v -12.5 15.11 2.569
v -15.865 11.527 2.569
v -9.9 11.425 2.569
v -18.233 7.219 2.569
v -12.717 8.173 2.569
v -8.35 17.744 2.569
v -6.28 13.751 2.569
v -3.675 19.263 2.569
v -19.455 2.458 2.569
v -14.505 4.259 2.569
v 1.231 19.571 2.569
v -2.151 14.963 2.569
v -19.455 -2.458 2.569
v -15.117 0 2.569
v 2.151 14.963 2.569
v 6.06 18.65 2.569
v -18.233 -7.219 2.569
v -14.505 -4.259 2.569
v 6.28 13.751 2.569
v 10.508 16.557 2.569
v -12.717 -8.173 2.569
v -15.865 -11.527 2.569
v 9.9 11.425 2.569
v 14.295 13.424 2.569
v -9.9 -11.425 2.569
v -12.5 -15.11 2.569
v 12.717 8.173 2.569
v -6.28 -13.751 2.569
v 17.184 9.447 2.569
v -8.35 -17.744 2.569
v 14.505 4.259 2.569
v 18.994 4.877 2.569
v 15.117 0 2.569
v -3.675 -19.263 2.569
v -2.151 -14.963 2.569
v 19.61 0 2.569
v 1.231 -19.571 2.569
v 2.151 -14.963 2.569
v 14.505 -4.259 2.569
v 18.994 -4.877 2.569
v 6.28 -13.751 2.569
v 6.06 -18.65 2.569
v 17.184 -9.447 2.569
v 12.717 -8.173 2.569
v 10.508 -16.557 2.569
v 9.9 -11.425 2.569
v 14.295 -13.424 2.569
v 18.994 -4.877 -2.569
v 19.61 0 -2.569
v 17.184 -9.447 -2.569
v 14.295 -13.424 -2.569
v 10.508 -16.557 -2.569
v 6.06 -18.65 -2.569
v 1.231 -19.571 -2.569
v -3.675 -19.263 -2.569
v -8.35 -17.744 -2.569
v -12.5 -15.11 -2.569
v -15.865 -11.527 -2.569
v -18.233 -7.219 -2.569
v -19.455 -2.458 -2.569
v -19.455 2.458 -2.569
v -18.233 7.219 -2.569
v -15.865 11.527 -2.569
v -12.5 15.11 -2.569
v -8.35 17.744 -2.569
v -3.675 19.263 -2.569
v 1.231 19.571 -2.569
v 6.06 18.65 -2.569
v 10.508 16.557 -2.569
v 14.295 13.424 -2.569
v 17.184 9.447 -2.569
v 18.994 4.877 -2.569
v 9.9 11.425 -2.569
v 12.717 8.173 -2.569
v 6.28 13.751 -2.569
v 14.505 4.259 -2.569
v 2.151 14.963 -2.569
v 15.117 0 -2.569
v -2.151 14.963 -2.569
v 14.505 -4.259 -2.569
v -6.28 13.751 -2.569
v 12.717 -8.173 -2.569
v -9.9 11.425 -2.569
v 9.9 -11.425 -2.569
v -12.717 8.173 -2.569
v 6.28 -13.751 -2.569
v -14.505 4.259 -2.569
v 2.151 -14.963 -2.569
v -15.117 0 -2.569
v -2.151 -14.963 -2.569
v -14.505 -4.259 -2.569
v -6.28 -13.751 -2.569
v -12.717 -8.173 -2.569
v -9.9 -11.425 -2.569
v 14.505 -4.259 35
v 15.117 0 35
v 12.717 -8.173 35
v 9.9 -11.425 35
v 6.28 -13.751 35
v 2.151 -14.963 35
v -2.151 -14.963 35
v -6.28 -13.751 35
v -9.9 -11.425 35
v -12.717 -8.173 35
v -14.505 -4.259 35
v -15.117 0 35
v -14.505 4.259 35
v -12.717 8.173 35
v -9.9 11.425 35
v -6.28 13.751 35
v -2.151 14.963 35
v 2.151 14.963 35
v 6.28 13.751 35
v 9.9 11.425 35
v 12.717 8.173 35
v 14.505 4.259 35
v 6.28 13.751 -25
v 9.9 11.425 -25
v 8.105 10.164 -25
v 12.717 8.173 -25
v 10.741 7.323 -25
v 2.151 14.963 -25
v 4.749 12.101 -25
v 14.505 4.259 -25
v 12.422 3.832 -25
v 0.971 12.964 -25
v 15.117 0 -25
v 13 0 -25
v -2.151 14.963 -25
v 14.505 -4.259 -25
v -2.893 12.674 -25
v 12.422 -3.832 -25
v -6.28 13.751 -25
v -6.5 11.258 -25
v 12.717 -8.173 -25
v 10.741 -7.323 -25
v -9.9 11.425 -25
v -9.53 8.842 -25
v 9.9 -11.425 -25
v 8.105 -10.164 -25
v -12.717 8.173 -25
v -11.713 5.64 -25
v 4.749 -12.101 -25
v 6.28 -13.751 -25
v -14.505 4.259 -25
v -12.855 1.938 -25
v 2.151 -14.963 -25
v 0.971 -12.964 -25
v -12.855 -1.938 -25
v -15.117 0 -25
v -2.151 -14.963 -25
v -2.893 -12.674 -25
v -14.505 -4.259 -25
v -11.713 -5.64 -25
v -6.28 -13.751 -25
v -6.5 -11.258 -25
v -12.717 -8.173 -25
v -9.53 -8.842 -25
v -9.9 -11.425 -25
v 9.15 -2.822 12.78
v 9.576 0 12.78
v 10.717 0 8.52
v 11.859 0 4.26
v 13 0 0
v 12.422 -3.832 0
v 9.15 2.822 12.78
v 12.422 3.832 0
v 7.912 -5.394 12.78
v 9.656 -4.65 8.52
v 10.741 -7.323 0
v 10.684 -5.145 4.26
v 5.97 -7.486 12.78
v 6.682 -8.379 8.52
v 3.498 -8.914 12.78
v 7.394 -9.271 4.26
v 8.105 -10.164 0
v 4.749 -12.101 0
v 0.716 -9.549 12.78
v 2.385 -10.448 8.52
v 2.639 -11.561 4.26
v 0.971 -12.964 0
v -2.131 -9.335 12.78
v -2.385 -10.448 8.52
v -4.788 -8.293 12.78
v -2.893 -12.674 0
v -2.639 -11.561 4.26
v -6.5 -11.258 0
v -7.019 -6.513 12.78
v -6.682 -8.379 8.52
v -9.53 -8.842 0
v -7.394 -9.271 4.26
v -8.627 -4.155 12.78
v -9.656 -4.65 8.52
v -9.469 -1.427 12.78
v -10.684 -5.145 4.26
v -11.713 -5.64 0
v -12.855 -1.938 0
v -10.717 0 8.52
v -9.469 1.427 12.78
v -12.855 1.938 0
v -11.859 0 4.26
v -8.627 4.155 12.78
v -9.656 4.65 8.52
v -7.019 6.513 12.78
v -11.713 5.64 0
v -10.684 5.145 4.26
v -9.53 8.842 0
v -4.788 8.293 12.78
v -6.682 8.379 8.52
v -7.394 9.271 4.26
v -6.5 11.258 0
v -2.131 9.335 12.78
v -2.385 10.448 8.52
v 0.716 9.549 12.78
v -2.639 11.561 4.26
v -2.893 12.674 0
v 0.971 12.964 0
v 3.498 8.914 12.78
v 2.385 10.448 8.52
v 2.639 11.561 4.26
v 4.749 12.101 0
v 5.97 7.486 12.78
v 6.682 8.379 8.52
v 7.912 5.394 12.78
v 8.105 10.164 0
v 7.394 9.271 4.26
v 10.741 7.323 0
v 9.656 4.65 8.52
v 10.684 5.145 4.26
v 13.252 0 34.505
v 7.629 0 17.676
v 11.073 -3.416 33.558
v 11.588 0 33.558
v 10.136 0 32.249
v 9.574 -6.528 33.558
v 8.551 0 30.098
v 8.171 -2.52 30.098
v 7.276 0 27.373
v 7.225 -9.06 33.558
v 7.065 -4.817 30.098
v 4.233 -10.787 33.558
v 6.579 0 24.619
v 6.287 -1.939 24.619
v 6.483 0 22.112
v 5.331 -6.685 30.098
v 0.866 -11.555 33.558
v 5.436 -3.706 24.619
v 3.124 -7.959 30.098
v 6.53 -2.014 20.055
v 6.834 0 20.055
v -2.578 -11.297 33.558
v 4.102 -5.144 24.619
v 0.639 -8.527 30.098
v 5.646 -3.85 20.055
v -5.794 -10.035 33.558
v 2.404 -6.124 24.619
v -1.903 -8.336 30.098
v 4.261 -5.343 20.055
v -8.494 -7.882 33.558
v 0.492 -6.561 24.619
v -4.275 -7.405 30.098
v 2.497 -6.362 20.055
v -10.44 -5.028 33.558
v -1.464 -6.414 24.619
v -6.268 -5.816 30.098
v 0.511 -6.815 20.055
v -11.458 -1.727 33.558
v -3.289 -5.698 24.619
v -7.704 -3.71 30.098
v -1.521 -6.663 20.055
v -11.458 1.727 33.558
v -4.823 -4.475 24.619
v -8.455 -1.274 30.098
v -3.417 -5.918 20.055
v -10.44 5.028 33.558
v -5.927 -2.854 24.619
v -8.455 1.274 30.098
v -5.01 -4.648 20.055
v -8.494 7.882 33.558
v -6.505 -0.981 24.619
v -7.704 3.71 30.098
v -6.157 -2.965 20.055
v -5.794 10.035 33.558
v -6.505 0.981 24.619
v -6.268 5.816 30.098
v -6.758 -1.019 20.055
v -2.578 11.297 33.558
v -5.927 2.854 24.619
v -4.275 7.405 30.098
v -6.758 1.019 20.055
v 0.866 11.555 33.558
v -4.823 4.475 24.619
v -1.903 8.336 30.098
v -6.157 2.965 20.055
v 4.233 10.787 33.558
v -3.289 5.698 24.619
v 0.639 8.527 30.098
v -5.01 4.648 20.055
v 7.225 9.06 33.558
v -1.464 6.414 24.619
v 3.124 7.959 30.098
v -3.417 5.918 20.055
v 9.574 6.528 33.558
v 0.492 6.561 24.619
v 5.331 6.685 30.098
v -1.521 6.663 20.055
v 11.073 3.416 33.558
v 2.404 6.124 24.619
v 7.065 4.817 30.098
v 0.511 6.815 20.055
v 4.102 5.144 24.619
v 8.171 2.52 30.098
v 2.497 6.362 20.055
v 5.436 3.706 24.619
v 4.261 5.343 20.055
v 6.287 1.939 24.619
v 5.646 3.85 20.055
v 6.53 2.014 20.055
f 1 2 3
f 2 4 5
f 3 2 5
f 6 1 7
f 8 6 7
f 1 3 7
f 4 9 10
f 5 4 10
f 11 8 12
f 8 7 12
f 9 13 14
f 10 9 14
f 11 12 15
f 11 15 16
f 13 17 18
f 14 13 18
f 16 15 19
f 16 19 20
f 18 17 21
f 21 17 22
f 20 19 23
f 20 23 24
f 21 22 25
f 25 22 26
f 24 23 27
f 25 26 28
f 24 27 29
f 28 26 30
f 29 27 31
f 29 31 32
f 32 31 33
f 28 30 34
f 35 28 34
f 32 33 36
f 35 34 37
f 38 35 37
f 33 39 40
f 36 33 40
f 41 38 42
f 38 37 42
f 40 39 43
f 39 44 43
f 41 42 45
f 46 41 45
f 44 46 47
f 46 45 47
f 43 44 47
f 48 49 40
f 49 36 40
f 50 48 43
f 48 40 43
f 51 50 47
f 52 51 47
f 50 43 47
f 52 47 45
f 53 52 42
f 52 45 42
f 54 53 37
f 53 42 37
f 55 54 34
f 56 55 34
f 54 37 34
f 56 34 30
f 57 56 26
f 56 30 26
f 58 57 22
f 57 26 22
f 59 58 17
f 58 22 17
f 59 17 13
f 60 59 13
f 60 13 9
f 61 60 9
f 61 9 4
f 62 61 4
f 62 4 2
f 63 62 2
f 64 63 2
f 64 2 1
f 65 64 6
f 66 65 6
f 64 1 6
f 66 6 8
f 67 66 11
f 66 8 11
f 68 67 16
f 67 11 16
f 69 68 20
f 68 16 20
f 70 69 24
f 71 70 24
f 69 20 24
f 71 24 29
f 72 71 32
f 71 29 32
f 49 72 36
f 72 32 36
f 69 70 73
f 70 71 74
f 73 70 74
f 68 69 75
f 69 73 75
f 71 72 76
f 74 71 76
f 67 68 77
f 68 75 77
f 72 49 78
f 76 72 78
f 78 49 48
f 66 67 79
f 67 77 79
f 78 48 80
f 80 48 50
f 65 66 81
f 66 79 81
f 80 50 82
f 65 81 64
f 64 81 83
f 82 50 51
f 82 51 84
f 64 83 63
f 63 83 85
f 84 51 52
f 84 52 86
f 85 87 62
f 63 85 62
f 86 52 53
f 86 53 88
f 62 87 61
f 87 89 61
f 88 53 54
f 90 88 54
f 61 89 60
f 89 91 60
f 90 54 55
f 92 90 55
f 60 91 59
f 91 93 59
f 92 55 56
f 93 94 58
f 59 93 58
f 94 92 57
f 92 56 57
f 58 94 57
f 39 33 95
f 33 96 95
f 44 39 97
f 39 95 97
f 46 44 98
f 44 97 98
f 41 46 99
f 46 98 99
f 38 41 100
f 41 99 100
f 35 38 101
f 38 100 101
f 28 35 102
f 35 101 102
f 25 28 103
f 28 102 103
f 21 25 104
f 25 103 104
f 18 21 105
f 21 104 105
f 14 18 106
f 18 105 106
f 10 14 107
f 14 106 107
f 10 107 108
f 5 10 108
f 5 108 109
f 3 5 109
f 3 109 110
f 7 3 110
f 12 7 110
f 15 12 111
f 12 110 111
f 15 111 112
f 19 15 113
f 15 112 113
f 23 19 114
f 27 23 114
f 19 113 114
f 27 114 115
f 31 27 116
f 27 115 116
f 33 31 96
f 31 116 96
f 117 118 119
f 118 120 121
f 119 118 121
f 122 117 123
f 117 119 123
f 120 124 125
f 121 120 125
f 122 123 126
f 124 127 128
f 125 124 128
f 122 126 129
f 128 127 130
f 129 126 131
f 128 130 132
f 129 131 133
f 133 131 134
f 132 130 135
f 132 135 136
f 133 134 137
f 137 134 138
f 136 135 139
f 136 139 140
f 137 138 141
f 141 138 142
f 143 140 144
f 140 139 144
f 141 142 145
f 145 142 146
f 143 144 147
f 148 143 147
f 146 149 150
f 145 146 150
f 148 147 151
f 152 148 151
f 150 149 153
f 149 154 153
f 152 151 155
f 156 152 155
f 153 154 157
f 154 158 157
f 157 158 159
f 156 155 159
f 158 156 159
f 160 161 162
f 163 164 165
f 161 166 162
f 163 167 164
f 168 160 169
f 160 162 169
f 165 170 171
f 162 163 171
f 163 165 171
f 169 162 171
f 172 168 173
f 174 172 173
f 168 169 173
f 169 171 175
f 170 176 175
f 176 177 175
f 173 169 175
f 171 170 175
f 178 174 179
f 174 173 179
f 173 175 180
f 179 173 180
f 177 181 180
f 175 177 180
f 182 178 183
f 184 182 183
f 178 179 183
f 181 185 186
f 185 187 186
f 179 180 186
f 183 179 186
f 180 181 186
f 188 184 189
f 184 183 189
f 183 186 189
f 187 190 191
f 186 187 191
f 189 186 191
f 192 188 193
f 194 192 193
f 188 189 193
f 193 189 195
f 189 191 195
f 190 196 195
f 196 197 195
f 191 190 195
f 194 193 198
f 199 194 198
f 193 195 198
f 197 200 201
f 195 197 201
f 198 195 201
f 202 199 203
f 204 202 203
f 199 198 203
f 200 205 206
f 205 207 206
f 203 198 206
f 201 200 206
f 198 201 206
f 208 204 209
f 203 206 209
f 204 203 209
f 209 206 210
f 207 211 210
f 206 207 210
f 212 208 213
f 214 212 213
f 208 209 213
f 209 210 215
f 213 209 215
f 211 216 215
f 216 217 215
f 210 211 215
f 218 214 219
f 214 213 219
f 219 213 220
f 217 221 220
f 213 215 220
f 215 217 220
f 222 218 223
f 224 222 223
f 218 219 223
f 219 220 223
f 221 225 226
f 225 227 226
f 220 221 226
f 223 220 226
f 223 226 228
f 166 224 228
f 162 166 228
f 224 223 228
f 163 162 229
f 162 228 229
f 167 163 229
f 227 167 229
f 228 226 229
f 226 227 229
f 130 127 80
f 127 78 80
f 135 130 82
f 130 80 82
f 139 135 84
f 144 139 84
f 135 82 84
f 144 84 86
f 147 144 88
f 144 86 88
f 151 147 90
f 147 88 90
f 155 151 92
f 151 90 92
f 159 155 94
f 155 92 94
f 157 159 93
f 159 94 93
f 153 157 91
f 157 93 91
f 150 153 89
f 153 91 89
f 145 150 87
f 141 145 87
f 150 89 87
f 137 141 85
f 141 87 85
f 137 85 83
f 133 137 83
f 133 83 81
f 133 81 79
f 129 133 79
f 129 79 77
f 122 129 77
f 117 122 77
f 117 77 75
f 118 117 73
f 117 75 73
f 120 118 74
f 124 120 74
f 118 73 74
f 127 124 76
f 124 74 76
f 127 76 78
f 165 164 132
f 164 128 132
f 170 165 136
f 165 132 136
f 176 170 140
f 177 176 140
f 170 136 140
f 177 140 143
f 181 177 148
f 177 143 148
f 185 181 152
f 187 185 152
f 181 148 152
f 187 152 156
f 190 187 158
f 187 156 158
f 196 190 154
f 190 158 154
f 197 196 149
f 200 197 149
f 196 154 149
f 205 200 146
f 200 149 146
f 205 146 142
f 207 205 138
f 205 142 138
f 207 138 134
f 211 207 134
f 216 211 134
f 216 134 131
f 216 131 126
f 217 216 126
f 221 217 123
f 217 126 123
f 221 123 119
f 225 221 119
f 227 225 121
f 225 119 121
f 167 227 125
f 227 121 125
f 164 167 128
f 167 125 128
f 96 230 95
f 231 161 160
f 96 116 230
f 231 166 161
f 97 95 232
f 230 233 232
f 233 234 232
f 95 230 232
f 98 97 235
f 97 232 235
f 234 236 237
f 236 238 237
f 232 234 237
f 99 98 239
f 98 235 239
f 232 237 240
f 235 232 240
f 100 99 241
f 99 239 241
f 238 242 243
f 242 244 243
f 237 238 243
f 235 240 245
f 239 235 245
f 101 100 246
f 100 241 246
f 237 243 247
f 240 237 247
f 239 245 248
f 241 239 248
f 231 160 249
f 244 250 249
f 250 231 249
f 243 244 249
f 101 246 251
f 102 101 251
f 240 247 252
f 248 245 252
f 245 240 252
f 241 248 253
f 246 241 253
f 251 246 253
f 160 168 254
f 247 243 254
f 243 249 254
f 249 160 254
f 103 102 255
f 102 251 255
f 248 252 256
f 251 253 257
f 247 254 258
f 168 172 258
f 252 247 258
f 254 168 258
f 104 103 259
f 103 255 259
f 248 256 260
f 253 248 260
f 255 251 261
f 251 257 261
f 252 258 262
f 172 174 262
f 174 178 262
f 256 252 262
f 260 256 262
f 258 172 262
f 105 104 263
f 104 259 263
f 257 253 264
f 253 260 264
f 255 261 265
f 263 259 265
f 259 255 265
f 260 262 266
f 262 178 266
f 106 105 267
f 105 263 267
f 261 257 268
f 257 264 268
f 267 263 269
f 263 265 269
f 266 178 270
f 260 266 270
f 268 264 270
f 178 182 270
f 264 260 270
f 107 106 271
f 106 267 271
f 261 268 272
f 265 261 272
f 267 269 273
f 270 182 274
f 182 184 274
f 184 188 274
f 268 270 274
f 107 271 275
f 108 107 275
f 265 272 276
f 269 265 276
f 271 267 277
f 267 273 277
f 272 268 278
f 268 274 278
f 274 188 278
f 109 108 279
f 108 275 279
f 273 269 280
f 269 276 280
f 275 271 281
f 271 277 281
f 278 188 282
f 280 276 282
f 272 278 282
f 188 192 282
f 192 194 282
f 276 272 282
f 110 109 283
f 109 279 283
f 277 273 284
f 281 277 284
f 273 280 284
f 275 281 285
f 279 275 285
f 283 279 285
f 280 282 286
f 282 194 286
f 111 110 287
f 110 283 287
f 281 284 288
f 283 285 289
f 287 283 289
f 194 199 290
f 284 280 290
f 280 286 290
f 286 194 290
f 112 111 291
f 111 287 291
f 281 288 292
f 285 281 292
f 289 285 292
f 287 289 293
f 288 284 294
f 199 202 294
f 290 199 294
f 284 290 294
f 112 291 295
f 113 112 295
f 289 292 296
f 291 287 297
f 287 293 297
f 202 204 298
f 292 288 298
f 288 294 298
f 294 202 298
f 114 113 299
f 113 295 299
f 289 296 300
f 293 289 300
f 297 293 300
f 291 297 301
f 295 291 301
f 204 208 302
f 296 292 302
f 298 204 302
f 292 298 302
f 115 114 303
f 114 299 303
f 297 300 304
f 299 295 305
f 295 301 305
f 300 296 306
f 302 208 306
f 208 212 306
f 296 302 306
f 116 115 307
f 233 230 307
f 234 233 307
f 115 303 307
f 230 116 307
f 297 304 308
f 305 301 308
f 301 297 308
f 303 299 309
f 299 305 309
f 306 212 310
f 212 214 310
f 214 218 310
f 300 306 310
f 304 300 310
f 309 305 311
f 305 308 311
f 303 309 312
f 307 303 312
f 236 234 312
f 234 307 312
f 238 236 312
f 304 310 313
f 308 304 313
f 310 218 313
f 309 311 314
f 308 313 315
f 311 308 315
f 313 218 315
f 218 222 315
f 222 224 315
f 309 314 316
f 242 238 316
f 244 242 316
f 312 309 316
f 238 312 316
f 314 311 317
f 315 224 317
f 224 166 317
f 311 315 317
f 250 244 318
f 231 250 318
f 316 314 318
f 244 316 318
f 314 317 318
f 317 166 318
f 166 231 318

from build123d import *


with BuildPart() as f1:
    # F0 (on Front) → F1 (revolve)
    with BuildSketch(Plane.XZ):
        with BuildLine():
            Line((13, -25), (15.1172224432, -25))
            Line((15.1172224432, -25), (15.1172224432, -2.5685927831))
            Line((15.1172224432, -2.5685927831), (15.1172224432, 2.5685927831))
            Line((15.1172224432, 2.5685927831), (15.1172224432, 35))
            add(Edge.make_bspline(
                [(15.1172224432, 35), (10.0791664263, 34.3889759882), (4.0376053781, 22.9443653974), (8.016607968, 17.2045025786), (9.5755117753, 12.7803640445)],
                knots=[0, 0, 0, 0, 0.5233807249, 1, 1, 1, 1], degree=3))
            Line((9.5755117753, 12.7803640445), (13, 0))
            Line((13, 0), (13, -25))
        make_face()
        Polygon((15.1172224432, 2.5685927831), (15.1172224432, -2.5685927831), (19.6100920439, -2.5685927831), (19.6100920439, 0), (19.6100920439, 2.5685927831), align=None)
    revolve(axis=Axis((0, 0, -12.5), (0, 0, -1)))


solid = f1.part
